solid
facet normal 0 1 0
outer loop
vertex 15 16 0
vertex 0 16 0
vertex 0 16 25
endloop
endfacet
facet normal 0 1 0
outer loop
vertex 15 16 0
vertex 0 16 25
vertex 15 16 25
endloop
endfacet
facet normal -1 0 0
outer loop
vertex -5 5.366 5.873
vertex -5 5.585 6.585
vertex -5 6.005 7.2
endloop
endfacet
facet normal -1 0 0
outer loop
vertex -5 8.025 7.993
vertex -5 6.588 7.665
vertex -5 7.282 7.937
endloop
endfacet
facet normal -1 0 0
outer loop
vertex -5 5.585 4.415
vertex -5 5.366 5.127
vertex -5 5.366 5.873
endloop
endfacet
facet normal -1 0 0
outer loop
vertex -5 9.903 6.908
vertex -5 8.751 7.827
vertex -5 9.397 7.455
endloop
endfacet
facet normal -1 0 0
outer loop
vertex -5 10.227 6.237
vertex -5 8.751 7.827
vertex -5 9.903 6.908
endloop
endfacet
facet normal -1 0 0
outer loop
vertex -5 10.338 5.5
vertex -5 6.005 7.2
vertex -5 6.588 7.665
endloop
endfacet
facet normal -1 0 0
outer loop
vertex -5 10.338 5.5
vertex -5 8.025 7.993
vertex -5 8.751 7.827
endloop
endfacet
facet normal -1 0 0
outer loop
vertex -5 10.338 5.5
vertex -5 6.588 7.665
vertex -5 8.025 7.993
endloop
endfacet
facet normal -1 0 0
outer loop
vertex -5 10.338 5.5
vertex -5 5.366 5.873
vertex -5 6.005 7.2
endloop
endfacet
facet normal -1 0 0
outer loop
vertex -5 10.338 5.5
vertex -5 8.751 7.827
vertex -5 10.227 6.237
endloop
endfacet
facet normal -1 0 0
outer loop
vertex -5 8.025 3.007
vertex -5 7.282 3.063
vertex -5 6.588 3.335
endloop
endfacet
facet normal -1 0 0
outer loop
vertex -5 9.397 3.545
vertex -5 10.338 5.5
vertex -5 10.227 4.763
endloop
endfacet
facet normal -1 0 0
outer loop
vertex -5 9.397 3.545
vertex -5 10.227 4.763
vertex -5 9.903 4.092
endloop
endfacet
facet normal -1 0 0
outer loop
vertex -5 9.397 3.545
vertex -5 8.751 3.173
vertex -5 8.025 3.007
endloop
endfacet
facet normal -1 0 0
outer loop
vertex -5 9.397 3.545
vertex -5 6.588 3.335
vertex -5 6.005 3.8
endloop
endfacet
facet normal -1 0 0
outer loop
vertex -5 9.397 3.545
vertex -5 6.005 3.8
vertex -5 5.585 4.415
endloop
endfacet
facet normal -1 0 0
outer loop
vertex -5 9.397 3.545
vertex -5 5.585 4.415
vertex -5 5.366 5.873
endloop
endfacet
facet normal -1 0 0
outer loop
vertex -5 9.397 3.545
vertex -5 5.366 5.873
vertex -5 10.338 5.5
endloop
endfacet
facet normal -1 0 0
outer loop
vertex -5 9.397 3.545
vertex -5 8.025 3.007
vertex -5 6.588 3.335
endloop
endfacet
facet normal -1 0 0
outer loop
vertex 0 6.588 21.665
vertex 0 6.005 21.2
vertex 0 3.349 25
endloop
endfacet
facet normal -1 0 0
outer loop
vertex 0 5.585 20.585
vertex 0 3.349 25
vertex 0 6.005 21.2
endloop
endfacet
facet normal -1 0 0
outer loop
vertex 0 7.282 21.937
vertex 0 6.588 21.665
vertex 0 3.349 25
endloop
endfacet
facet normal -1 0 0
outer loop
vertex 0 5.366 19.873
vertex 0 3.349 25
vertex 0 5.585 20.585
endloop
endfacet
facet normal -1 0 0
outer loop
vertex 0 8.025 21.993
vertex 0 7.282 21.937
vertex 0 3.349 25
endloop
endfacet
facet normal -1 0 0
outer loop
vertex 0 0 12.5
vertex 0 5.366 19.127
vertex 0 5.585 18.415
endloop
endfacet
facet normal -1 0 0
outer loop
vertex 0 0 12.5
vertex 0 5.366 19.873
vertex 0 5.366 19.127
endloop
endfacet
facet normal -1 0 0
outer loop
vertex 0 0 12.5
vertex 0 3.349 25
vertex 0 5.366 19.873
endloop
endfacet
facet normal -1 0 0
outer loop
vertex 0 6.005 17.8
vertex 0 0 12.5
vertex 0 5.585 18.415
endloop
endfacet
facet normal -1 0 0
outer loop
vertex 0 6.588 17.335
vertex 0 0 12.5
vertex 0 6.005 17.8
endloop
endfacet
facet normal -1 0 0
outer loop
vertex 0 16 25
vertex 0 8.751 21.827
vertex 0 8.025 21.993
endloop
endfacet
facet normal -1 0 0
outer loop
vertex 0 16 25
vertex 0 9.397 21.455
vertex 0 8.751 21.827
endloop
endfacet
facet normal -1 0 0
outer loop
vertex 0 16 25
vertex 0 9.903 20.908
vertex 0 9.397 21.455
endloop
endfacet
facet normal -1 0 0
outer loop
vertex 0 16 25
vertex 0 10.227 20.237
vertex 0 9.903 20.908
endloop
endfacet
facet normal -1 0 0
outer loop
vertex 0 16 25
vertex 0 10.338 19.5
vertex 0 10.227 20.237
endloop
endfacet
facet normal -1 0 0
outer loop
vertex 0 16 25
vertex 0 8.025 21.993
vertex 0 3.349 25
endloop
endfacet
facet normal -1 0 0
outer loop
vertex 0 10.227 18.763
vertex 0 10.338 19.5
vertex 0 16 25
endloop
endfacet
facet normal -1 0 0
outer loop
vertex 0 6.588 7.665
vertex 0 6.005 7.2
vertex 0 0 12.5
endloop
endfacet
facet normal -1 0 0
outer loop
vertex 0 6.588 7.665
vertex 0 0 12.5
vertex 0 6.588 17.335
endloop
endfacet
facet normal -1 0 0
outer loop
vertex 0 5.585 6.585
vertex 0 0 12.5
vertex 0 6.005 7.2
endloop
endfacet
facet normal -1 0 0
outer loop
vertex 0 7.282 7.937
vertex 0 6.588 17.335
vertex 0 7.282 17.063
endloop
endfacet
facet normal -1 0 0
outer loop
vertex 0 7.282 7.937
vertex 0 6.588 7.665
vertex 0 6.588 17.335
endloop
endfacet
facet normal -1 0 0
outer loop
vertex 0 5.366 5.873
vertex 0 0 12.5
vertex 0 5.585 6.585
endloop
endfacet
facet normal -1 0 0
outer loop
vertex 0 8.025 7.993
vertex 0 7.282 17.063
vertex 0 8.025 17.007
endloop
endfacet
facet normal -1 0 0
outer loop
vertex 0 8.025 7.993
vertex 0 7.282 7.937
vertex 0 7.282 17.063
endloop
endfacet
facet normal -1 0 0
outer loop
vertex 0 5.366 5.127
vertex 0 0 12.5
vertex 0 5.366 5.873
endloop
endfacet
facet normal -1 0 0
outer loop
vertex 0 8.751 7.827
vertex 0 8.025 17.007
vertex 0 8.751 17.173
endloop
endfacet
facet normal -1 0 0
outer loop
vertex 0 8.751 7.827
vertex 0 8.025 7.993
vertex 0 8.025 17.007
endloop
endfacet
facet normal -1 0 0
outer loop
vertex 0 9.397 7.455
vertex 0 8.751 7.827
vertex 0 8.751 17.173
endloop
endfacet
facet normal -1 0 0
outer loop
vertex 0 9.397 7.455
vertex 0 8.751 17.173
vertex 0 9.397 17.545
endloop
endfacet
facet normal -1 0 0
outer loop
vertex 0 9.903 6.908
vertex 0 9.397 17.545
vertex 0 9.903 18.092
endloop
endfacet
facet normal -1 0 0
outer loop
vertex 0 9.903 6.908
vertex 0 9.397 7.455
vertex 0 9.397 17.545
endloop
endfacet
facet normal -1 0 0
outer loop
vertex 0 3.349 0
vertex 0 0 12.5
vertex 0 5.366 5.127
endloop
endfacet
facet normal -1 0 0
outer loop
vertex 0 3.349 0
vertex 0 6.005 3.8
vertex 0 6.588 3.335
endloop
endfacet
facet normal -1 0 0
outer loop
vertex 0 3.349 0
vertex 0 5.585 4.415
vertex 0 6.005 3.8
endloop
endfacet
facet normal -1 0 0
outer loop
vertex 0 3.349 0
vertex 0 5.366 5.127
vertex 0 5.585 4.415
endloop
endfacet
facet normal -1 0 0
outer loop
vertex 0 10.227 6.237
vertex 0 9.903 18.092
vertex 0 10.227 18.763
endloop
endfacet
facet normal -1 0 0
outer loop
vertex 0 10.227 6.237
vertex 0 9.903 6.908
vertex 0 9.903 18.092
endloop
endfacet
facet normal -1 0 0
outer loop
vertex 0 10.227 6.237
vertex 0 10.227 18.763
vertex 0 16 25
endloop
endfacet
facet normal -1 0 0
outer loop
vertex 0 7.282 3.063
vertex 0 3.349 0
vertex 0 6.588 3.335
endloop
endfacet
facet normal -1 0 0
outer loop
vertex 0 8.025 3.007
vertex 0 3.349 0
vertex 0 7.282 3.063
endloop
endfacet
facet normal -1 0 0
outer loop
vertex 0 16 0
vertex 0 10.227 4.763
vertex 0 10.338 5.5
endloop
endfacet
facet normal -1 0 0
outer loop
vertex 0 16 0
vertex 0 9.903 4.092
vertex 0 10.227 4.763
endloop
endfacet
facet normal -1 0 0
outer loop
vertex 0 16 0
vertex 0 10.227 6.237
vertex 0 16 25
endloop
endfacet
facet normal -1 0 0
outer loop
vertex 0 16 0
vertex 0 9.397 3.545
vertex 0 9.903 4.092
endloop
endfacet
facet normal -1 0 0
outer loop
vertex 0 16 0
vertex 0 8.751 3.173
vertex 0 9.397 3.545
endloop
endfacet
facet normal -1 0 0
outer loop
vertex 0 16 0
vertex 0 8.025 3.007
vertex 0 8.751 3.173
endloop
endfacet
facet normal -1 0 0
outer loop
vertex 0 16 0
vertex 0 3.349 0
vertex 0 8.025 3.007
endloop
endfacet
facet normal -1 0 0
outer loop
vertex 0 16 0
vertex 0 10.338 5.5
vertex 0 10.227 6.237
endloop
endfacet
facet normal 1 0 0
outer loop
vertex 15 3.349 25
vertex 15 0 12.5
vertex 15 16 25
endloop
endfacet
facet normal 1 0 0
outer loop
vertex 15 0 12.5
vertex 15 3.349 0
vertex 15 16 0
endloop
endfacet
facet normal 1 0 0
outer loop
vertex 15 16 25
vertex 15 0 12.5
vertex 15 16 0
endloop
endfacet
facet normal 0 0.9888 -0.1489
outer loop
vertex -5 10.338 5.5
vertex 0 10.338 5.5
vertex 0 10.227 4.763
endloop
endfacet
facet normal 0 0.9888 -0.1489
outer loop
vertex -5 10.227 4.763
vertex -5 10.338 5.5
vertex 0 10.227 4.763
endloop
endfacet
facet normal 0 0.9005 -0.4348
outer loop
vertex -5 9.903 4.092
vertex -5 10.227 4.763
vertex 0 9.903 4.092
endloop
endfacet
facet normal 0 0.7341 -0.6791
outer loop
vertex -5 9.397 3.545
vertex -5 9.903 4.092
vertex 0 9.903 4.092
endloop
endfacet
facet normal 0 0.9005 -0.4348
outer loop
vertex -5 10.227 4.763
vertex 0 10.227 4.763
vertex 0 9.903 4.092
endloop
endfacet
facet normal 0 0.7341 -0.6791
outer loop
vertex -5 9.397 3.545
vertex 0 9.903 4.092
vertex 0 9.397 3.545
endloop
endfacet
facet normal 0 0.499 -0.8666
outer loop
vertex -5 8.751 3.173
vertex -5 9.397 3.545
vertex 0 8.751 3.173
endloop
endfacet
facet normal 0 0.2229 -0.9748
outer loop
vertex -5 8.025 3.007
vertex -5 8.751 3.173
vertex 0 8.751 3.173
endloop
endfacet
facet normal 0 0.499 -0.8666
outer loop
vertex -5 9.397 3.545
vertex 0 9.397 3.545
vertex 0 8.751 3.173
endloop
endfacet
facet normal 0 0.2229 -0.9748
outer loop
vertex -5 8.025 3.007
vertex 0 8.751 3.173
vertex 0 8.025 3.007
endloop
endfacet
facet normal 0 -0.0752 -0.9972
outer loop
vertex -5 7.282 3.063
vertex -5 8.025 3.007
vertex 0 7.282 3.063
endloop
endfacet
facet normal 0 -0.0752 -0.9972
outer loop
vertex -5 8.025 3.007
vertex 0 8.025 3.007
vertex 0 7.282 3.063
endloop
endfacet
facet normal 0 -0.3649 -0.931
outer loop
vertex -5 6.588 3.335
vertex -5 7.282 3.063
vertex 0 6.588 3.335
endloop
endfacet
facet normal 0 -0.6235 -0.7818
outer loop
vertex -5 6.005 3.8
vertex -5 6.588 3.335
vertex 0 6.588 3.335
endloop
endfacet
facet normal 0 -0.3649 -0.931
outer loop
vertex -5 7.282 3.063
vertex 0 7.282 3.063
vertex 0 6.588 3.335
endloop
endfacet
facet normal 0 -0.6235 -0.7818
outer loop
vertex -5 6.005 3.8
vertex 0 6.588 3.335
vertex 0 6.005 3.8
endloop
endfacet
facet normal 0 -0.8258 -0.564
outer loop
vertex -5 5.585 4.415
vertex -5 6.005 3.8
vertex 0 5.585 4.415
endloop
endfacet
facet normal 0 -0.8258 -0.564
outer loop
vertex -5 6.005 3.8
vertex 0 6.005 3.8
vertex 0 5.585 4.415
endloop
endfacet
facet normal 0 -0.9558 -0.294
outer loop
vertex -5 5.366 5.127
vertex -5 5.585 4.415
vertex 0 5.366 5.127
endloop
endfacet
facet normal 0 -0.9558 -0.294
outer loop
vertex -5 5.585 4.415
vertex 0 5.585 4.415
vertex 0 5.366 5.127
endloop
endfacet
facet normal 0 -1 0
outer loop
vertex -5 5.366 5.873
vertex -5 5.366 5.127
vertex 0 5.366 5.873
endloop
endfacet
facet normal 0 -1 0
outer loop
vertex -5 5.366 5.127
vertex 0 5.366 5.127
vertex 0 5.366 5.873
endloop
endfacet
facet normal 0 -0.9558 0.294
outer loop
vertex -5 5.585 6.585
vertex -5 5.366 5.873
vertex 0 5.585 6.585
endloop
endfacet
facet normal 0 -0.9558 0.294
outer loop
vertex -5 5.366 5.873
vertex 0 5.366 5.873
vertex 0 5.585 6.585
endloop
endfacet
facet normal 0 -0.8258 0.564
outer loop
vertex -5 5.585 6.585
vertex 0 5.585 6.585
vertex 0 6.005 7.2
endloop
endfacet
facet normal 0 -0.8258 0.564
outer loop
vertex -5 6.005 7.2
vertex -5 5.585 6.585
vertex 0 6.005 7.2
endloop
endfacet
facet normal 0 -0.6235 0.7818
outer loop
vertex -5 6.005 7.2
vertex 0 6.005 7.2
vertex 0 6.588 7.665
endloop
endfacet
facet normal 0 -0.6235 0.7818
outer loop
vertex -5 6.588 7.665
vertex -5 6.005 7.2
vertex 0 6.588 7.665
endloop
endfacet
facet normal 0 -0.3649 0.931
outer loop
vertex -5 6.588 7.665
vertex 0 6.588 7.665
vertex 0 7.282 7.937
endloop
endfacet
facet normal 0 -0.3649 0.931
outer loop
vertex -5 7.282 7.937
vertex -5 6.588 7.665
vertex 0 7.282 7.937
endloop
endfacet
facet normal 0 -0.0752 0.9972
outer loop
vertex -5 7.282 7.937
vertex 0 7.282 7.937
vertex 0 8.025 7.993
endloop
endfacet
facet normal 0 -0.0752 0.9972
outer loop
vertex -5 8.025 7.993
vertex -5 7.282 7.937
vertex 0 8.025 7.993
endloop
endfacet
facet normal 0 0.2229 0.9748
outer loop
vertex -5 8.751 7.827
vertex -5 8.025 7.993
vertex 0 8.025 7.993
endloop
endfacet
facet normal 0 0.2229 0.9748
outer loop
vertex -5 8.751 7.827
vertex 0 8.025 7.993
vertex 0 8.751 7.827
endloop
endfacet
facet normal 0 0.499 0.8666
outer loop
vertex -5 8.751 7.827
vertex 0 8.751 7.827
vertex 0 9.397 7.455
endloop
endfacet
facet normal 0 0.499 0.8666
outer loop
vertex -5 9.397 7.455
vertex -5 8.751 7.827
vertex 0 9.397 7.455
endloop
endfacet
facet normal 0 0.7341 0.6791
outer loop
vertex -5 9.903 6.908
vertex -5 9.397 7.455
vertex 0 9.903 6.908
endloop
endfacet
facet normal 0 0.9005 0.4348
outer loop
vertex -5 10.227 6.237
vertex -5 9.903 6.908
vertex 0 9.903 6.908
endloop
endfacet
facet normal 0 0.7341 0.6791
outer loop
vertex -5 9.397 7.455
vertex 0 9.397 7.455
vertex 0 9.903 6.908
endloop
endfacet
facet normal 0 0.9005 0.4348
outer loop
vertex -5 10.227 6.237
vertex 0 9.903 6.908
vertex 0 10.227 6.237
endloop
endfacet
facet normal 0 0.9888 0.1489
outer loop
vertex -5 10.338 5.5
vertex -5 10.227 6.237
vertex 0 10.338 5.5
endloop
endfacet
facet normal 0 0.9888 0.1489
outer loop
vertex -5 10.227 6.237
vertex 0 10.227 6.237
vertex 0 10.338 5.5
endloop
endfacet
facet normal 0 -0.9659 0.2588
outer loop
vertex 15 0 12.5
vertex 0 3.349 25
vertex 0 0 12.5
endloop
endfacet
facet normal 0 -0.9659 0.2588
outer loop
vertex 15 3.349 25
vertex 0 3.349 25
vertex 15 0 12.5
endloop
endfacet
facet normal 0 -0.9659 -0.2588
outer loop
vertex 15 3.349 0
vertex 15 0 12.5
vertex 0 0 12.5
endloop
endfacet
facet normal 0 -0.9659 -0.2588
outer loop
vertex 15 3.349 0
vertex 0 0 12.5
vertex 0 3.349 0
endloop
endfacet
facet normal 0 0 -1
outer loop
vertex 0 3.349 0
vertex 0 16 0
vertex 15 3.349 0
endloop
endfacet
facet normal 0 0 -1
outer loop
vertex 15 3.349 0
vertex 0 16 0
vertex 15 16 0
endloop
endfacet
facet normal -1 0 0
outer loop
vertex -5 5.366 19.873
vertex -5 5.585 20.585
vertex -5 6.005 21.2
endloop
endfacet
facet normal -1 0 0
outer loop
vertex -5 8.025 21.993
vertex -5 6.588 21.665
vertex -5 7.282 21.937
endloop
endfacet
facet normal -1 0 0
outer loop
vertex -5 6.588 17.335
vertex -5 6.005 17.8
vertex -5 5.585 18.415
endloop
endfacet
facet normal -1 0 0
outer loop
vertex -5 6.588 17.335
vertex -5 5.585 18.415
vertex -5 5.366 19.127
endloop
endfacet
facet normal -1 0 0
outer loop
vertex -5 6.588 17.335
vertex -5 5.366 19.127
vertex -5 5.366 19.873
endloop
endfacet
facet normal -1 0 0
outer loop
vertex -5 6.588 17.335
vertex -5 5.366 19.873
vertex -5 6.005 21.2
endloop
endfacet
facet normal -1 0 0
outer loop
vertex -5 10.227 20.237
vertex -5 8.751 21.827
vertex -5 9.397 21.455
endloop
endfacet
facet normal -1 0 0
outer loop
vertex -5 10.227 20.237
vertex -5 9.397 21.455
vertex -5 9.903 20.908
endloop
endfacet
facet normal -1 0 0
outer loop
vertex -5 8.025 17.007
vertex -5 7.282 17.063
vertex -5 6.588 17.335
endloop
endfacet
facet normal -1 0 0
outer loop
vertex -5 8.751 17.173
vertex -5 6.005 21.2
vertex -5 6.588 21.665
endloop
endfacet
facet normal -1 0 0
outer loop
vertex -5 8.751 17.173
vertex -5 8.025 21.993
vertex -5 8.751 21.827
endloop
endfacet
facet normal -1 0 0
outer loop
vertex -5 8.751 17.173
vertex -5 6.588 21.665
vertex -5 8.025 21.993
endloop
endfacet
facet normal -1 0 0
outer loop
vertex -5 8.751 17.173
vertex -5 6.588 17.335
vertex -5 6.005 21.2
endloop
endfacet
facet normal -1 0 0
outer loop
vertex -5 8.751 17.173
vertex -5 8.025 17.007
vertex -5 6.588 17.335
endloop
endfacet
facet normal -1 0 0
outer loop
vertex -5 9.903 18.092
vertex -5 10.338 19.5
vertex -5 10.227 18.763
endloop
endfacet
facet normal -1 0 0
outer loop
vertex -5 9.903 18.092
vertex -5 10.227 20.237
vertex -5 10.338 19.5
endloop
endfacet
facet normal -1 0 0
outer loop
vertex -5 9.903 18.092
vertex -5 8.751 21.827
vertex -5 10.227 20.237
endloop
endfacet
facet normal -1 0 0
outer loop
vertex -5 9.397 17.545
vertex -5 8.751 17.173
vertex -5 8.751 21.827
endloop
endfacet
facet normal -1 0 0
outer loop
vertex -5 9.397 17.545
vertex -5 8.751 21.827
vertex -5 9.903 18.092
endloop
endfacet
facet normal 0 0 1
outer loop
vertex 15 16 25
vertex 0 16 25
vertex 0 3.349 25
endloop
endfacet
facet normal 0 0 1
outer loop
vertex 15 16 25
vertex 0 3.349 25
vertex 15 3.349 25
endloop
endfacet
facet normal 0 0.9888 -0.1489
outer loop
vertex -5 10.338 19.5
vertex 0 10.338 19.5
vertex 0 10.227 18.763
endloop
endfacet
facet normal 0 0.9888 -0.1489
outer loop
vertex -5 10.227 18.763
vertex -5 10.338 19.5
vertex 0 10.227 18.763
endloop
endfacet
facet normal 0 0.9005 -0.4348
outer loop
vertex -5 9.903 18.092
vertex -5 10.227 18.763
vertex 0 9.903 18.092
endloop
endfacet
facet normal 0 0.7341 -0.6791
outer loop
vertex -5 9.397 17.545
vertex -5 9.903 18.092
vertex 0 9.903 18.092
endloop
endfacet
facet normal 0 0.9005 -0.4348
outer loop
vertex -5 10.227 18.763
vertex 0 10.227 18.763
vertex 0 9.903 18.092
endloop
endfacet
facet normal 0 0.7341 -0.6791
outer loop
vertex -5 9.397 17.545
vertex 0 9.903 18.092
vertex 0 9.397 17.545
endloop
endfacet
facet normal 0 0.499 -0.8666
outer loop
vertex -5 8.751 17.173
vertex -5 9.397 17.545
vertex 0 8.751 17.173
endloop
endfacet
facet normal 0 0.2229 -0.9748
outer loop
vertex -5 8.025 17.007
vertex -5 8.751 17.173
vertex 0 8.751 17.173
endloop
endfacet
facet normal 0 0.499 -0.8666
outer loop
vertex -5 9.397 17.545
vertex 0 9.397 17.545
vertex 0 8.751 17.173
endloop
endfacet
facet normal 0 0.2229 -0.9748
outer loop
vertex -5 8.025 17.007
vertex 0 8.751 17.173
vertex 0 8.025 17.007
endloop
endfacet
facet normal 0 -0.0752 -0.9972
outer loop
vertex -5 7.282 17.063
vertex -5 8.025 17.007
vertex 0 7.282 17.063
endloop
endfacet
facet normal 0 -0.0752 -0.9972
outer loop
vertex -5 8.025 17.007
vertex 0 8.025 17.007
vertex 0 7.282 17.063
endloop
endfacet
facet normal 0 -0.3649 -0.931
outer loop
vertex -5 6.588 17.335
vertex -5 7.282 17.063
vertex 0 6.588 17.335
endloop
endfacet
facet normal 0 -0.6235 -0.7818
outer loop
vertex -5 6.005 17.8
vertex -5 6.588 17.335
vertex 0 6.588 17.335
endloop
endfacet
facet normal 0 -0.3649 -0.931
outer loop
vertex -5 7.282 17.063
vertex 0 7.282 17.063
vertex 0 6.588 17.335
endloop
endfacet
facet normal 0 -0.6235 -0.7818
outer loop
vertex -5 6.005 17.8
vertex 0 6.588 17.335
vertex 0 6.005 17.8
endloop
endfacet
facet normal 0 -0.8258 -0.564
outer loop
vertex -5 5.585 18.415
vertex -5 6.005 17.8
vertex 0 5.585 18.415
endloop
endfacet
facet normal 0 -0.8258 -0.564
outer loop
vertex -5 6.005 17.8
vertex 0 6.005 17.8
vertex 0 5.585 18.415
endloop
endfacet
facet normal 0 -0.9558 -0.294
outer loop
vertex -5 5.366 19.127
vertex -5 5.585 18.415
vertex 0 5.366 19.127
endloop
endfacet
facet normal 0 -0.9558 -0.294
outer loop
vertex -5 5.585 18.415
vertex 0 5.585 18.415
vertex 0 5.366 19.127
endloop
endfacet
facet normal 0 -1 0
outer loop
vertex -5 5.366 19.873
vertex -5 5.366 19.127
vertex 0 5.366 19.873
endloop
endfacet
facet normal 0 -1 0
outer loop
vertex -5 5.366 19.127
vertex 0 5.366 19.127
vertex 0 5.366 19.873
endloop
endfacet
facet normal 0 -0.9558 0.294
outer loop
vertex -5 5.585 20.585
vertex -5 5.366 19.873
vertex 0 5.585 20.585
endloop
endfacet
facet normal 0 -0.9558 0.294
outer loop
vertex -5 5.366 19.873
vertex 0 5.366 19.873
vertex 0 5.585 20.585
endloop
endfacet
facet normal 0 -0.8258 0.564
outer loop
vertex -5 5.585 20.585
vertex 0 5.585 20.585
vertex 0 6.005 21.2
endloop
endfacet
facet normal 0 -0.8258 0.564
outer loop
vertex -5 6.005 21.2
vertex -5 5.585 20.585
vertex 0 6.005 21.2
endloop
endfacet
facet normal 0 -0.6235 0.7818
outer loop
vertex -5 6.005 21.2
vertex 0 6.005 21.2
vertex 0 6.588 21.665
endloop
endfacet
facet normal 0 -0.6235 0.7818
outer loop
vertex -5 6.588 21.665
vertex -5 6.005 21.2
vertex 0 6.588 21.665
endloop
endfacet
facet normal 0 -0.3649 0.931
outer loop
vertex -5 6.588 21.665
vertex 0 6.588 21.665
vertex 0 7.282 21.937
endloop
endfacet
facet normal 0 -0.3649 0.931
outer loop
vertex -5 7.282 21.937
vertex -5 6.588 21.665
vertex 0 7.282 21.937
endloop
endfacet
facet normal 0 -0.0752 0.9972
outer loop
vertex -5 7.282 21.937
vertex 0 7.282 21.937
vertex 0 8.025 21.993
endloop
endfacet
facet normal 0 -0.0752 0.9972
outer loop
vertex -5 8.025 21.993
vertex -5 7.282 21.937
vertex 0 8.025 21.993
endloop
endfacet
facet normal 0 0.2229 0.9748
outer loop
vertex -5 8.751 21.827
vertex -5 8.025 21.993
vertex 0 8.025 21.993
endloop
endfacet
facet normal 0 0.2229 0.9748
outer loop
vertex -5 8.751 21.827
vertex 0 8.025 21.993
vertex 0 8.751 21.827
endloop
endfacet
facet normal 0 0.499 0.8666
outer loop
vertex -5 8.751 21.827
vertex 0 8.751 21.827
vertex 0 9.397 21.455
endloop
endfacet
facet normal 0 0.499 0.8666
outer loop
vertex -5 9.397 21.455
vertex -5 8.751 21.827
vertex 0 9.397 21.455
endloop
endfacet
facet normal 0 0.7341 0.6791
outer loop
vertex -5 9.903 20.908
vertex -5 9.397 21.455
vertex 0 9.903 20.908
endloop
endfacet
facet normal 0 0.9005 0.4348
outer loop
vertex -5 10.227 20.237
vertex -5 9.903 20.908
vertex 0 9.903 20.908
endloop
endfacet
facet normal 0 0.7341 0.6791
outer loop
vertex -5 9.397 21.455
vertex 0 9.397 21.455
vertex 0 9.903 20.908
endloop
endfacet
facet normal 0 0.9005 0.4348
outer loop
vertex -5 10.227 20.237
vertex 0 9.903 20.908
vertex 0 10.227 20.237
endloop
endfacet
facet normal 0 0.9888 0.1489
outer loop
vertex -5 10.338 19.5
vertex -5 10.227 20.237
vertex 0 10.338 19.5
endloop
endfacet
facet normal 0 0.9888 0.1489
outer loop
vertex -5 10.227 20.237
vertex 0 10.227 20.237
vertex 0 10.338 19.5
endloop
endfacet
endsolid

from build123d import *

# Parameters (mm, degrees)
SKETCH2_W           = 15
SKETCH2_H           = 16
BOSS_EXTRUDE2_DEPTH = 25
SKETCH3_R           = 2.5
BOSS_EXTRUDE3_DEPTH = 5
CHAMFER1_SIZE       = 12.5
CHAMFER1_SIZE2      = 3.349364905
CHAMFER2_SIZE       = 12.5
CHAMFER2_SIZE_2     = 3.349364905


with BuildPart() as part:
    # Sketch2 → Boss-Extrude2 (new body)
    with BuildSketch(Plane.XY):
        with Locations((7.5, 8)):
            Rectangle(SKETCH2_W, SKETCH2_H)
    extrude(amount=BOSS_EXTRUDE2_DEPTH)

    # Sketch3 → Boss-Extrude3 (add)
    with BuildSketch(Plane.ZY):
        with Locations(Location((5.5, 7.837863741, 0), (0, 0, 90))):
            Circle(SKETCH3_R)
        with Locations(Location((19.5, 7.837863741, 0), (0, 0, 90))):
            Circle(SKETCH3_R)
    extrude(amount=BOSS_EXTRUDE3_DEPTH)

    # Chamfer1
    chamfer1_edges = [part.edges().sort_by_distance(p)[0] for p in [
        (7.5, 0, 25),
    ]]
    chamfer1_side = [part.faces().sort_by_distance(p)[0] for p in [
        (7.5, 0, 12.5),
    ]]
    chamfer(chamfer1_edges, length=CHAMFER1_SIZE, length2=CHAMFER1_SIZE2, reference=chamfer1_side[0])

    # Chamfer2
    # the kernel refuses this chamfer: 12.5, 3.349364905 mm, written as the material it takes off along each edge
    with BuildSketch(Plane(origin=(-32.459019628, 0, 0), x_dir=(0, -0.009967146577156423, 0.9999503267608394), z_dir=(1, 0, 0))) as chamfer2_piece_1:
        Polygon((CHAMFER2_SIZE * 0.999950326761, -CHAMFER2_SIZE * 0.00996714657716), (-CHAMFER2_SIZE_2 * 0.00996714657831, -CHAMFER2_SIZE_2 * 0.999950326877), (0, 0), align=None)
    extrude(amount=79.918039255, mode=Mode.SUBTRACT)


solid = part.part
